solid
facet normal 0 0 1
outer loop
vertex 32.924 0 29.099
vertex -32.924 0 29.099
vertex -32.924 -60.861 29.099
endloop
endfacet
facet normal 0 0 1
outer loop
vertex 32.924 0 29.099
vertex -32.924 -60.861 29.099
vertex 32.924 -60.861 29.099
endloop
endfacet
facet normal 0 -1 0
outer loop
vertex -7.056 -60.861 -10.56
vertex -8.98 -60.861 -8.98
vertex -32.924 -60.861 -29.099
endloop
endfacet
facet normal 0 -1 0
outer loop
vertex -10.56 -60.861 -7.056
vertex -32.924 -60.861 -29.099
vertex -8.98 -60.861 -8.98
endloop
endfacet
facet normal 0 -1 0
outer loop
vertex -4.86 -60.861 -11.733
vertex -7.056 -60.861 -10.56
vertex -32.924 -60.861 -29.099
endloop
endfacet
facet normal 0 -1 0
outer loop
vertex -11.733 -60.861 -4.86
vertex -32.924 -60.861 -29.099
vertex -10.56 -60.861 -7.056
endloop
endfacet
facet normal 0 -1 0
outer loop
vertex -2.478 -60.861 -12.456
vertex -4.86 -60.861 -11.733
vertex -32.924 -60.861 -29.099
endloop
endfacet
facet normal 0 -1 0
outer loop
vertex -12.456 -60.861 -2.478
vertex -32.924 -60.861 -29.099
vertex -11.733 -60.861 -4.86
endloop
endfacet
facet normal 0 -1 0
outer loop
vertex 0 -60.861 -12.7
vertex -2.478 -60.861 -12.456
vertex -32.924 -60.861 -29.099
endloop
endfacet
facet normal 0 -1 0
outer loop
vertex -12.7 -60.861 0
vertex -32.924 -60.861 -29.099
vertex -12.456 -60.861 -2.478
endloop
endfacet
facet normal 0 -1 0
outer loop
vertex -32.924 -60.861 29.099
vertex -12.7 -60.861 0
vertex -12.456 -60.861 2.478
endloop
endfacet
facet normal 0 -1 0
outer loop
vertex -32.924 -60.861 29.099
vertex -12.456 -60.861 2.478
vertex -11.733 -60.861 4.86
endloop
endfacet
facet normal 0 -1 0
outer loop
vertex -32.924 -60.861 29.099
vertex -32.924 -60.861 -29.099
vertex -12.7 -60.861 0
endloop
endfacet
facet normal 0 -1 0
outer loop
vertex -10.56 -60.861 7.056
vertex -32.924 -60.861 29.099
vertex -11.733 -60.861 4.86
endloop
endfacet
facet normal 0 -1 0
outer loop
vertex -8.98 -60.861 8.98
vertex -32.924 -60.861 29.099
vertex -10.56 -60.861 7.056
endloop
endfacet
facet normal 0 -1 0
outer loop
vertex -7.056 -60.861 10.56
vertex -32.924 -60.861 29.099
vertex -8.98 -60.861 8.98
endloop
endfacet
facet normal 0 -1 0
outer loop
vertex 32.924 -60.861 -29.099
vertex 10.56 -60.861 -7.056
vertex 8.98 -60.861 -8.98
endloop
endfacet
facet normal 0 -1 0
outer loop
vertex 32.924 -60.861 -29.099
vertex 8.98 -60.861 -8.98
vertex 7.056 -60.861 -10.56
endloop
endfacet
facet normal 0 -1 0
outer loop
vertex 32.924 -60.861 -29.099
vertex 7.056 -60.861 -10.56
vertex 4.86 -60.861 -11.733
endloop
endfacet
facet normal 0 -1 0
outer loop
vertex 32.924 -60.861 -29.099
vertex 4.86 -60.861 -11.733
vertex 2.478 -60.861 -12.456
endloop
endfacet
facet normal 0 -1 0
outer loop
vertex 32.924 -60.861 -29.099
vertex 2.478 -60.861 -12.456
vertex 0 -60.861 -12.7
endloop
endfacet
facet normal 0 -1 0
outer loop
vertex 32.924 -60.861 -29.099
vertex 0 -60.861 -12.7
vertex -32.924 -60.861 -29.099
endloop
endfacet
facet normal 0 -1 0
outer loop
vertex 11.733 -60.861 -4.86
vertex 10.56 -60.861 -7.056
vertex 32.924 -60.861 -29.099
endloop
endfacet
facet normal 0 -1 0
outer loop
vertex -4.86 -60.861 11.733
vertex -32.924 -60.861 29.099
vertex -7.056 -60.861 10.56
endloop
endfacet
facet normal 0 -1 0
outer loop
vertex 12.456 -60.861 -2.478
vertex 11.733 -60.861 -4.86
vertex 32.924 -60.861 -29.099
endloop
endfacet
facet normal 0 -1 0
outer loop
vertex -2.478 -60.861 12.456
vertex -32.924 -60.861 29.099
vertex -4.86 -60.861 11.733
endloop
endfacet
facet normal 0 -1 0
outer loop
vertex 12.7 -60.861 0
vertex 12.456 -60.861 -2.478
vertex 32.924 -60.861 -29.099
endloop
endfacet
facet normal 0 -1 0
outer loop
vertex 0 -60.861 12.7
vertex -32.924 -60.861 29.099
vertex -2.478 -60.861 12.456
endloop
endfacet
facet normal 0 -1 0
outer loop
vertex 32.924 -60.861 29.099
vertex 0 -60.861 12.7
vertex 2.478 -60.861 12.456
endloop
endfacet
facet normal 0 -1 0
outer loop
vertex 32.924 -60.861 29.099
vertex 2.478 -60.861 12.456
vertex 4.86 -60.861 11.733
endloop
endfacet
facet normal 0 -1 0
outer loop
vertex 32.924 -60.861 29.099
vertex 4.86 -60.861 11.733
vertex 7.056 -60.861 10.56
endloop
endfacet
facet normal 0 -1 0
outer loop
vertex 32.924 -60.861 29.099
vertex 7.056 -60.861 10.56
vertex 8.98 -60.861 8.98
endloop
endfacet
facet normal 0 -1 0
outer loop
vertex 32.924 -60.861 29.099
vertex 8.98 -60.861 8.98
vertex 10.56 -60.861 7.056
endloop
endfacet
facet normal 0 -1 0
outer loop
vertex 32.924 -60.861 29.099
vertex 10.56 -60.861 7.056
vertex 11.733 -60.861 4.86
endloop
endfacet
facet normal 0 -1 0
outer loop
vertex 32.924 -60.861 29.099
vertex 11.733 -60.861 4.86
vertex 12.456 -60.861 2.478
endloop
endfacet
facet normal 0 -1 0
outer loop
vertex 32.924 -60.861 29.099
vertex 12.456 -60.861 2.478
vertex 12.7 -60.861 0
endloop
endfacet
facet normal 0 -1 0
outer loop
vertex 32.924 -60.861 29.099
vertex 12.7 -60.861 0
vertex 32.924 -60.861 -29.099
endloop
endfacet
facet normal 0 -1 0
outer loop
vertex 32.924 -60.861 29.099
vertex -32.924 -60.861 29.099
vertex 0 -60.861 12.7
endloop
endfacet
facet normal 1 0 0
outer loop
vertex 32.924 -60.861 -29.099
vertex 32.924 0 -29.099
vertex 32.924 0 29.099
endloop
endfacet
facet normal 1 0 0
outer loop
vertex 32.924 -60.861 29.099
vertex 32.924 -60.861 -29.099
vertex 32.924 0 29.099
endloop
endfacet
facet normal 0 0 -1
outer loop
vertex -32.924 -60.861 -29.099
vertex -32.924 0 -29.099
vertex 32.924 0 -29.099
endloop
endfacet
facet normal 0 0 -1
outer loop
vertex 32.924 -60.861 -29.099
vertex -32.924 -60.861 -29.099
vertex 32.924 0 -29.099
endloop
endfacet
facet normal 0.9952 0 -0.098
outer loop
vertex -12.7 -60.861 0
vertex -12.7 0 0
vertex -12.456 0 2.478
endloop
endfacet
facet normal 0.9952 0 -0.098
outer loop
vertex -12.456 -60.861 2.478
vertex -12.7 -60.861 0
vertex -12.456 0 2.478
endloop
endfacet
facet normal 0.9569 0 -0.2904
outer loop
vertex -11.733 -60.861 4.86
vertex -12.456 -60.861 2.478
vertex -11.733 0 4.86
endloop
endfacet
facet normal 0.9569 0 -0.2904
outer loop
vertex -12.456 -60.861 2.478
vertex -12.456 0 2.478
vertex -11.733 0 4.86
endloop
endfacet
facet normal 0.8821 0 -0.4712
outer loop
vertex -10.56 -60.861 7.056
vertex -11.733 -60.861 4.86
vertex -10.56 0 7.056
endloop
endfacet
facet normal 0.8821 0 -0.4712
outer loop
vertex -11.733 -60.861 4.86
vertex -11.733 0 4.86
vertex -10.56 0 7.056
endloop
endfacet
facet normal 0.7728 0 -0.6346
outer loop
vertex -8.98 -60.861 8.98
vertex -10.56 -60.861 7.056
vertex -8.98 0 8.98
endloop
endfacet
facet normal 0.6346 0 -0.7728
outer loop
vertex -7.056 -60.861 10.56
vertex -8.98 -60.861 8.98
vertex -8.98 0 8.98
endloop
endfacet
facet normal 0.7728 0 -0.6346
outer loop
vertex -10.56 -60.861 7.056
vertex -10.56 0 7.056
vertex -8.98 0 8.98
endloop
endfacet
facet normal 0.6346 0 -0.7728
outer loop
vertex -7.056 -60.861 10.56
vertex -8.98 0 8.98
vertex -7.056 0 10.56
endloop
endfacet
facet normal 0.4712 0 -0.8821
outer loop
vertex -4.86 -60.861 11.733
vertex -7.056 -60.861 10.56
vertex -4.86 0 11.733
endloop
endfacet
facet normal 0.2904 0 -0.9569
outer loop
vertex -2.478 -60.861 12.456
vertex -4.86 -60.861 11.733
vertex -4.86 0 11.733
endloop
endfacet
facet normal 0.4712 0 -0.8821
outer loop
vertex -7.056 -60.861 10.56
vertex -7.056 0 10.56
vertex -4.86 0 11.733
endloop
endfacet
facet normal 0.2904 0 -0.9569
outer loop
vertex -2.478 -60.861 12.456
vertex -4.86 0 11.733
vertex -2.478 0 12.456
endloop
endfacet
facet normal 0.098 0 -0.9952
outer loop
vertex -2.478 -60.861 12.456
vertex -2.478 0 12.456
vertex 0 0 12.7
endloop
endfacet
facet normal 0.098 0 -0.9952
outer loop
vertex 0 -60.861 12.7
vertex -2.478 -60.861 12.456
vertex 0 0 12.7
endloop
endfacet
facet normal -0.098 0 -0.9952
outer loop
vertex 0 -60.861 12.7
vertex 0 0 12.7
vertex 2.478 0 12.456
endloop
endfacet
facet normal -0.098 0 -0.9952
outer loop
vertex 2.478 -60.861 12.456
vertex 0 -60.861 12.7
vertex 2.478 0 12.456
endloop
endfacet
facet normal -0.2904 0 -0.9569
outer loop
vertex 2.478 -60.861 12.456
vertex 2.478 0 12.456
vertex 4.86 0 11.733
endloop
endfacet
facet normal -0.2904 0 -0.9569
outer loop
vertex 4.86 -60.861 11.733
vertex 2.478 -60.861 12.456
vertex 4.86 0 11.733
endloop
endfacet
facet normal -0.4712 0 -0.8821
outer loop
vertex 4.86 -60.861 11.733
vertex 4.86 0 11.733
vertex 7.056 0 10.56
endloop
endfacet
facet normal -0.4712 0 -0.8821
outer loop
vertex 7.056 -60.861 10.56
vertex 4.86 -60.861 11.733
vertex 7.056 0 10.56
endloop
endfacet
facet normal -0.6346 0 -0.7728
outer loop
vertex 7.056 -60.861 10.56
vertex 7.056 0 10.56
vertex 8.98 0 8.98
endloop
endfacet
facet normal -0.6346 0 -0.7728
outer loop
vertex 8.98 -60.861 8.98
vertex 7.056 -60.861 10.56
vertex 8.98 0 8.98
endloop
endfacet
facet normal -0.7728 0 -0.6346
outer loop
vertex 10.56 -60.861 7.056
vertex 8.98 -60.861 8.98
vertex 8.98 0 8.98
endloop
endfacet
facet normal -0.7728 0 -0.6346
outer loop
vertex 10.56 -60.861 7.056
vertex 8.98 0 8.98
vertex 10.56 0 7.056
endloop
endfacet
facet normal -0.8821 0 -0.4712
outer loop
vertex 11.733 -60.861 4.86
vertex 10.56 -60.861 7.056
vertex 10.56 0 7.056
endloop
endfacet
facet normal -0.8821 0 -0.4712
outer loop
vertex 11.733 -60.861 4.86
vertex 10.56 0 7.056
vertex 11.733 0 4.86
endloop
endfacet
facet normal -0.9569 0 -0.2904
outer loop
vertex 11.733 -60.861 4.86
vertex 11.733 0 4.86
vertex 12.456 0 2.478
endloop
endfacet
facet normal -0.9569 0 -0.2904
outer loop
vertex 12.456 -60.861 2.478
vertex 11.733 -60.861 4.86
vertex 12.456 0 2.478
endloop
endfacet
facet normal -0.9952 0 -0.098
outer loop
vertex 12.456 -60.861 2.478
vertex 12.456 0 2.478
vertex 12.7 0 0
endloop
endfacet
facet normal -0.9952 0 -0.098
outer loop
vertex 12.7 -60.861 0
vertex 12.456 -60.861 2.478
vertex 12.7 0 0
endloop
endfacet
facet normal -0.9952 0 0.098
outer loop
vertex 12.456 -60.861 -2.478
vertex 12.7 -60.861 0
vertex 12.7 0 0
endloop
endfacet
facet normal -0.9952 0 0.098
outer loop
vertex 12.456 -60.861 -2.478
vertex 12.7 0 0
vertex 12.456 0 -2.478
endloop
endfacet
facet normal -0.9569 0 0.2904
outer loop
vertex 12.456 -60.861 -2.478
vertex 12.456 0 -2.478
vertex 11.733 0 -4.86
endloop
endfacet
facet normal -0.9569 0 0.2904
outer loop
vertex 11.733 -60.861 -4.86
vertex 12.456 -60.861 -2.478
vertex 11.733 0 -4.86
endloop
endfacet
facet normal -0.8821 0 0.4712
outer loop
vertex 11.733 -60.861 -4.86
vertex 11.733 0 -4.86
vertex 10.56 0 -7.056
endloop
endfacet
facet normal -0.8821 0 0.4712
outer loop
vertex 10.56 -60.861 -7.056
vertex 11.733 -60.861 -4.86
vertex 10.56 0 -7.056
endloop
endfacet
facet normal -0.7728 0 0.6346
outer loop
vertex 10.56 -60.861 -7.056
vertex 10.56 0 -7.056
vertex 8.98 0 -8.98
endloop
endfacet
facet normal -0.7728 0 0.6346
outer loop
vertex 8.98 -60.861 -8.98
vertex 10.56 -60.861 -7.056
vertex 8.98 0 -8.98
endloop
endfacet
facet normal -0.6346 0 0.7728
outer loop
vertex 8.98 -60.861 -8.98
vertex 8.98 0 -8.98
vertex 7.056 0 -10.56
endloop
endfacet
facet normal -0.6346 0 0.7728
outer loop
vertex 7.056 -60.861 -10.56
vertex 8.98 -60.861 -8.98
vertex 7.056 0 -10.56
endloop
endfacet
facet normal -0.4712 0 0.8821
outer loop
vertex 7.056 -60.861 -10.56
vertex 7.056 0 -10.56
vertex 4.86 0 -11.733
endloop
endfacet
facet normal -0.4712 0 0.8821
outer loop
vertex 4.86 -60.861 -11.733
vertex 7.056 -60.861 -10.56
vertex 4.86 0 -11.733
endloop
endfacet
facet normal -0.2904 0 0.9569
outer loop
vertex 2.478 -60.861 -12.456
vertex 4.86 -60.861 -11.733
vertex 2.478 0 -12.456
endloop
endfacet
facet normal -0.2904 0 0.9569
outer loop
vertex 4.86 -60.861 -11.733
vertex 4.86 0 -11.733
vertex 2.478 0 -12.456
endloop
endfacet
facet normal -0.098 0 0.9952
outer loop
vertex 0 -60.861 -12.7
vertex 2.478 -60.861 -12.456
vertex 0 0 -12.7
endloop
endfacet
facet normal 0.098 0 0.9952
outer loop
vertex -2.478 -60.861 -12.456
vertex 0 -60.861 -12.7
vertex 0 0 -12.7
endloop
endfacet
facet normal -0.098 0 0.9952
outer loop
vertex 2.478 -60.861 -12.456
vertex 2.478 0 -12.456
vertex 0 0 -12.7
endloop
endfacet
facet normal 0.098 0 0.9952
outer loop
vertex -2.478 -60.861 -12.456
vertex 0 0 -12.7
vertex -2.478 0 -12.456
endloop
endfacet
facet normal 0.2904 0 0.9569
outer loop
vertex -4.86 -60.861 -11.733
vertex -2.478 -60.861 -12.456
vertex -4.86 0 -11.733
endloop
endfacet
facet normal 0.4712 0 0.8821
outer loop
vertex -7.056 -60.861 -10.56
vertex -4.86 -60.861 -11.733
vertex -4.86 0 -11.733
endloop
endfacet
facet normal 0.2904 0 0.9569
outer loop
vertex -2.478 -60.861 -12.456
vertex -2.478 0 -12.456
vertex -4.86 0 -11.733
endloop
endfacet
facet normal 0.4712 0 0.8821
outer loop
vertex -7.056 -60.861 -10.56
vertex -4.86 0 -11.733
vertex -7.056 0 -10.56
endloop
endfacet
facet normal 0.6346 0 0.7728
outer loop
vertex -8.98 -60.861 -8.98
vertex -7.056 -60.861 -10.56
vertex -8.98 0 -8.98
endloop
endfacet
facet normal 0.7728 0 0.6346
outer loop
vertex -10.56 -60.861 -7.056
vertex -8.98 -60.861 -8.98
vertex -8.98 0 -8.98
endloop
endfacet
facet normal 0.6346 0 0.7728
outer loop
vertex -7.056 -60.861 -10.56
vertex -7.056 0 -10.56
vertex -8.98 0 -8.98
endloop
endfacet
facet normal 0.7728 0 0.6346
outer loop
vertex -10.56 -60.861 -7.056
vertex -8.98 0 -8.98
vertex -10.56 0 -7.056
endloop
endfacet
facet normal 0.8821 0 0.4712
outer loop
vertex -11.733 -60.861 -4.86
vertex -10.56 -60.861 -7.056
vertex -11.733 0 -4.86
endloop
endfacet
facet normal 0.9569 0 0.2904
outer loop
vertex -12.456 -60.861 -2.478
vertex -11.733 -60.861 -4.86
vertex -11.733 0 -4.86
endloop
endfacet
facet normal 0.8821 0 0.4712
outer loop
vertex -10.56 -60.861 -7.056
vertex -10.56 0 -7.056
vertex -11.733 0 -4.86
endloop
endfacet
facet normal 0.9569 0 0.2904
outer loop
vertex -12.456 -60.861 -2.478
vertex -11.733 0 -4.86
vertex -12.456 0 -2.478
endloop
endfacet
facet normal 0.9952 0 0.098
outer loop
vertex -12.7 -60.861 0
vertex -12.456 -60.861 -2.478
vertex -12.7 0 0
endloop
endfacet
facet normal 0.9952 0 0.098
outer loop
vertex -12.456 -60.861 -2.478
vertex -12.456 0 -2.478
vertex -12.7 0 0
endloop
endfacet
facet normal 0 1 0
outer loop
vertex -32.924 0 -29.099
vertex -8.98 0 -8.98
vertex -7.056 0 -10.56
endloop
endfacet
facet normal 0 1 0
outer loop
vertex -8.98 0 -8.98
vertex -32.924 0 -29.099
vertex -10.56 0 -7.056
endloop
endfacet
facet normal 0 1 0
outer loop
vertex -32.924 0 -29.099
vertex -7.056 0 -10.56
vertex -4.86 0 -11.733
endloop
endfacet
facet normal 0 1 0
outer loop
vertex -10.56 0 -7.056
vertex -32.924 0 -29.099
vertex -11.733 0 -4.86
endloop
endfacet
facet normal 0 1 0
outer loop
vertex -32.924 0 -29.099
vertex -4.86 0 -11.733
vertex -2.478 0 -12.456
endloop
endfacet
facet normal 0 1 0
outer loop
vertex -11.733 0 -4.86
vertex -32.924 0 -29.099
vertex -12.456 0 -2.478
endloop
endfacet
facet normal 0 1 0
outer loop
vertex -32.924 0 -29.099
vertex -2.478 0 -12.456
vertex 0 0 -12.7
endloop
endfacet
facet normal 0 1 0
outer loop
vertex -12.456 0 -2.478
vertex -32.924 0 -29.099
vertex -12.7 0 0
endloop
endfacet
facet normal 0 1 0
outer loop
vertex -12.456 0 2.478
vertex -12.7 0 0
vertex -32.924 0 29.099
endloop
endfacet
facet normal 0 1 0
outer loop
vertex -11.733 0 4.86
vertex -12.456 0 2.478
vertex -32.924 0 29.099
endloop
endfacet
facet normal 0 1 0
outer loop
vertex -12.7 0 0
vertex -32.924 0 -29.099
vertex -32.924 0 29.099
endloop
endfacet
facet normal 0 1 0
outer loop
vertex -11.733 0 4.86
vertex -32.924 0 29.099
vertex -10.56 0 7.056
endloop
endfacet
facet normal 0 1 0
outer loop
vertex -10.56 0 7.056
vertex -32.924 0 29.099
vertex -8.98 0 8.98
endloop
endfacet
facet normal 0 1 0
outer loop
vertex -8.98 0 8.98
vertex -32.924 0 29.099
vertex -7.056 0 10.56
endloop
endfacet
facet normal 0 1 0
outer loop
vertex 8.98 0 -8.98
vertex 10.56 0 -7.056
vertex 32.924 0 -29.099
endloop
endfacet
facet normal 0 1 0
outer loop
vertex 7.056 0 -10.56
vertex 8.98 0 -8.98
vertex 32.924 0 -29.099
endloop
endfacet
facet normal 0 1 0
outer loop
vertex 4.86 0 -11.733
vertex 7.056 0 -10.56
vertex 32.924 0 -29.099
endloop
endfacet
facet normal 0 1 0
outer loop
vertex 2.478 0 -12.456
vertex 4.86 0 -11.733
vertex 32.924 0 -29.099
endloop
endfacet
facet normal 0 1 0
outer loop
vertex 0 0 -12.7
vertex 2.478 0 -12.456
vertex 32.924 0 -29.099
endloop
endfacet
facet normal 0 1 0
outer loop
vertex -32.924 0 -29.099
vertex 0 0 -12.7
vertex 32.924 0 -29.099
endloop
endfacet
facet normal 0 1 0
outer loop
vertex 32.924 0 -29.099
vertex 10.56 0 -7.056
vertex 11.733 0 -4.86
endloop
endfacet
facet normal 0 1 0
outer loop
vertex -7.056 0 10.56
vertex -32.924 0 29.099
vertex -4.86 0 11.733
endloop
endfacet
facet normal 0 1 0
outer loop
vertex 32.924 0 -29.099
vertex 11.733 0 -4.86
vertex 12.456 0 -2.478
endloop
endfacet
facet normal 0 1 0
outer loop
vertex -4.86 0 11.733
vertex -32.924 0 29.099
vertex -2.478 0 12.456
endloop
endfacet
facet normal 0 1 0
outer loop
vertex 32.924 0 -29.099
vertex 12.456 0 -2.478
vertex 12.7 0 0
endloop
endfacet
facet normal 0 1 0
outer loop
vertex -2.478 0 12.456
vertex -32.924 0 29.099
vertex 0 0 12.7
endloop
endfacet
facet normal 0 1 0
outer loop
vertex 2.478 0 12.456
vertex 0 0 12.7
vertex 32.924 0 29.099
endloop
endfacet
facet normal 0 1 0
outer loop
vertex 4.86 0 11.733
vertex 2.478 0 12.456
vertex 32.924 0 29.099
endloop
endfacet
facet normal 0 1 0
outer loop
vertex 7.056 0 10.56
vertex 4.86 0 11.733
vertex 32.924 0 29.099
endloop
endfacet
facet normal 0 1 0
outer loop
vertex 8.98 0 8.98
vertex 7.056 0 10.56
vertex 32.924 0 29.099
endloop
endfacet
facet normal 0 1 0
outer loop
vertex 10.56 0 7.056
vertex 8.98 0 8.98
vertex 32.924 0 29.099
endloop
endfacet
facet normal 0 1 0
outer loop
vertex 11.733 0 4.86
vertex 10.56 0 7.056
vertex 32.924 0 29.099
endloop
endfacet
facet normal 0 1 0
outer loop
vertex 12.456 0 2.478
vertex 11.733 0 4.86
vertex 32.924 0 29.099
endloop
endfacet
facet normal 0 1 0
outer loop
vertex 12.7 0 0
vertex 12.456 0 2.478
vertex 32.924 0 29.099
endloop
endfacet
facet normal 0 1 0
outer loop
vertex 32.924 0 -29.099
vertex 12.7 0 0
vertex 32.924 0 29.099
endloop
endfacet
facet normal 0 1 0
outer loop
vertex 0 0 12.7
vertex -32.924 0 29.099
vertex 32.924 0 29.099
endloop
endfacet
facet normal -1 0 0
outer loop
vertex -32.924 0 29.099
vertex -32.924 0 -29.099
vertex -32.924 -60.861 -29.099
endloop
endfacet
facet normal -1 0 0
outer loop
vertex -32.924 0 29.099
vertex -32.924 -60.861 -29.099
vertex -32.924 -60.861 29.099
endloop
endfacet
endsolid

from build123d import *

# Parameters (mm, degrees)
F0_W     = 65.84879
F0_H     = 58.198094
F1_DEPTH = 60.86109
F4_D     = 25.4


with BuildPart() as f1:
    # F0 (on Front) → F1 (new body)
    with BuildSketch(Plane.XZ):
        Rectangle(F0_W, F0_H)
    extrude(amount=F1_DEPTH)

    # F4 (through all)
    with Locations(Plane.XZ.offset(60.86109)):
        with Locations((0, 0)):
            Hole(F4_D / 2)


solid = f1.part
